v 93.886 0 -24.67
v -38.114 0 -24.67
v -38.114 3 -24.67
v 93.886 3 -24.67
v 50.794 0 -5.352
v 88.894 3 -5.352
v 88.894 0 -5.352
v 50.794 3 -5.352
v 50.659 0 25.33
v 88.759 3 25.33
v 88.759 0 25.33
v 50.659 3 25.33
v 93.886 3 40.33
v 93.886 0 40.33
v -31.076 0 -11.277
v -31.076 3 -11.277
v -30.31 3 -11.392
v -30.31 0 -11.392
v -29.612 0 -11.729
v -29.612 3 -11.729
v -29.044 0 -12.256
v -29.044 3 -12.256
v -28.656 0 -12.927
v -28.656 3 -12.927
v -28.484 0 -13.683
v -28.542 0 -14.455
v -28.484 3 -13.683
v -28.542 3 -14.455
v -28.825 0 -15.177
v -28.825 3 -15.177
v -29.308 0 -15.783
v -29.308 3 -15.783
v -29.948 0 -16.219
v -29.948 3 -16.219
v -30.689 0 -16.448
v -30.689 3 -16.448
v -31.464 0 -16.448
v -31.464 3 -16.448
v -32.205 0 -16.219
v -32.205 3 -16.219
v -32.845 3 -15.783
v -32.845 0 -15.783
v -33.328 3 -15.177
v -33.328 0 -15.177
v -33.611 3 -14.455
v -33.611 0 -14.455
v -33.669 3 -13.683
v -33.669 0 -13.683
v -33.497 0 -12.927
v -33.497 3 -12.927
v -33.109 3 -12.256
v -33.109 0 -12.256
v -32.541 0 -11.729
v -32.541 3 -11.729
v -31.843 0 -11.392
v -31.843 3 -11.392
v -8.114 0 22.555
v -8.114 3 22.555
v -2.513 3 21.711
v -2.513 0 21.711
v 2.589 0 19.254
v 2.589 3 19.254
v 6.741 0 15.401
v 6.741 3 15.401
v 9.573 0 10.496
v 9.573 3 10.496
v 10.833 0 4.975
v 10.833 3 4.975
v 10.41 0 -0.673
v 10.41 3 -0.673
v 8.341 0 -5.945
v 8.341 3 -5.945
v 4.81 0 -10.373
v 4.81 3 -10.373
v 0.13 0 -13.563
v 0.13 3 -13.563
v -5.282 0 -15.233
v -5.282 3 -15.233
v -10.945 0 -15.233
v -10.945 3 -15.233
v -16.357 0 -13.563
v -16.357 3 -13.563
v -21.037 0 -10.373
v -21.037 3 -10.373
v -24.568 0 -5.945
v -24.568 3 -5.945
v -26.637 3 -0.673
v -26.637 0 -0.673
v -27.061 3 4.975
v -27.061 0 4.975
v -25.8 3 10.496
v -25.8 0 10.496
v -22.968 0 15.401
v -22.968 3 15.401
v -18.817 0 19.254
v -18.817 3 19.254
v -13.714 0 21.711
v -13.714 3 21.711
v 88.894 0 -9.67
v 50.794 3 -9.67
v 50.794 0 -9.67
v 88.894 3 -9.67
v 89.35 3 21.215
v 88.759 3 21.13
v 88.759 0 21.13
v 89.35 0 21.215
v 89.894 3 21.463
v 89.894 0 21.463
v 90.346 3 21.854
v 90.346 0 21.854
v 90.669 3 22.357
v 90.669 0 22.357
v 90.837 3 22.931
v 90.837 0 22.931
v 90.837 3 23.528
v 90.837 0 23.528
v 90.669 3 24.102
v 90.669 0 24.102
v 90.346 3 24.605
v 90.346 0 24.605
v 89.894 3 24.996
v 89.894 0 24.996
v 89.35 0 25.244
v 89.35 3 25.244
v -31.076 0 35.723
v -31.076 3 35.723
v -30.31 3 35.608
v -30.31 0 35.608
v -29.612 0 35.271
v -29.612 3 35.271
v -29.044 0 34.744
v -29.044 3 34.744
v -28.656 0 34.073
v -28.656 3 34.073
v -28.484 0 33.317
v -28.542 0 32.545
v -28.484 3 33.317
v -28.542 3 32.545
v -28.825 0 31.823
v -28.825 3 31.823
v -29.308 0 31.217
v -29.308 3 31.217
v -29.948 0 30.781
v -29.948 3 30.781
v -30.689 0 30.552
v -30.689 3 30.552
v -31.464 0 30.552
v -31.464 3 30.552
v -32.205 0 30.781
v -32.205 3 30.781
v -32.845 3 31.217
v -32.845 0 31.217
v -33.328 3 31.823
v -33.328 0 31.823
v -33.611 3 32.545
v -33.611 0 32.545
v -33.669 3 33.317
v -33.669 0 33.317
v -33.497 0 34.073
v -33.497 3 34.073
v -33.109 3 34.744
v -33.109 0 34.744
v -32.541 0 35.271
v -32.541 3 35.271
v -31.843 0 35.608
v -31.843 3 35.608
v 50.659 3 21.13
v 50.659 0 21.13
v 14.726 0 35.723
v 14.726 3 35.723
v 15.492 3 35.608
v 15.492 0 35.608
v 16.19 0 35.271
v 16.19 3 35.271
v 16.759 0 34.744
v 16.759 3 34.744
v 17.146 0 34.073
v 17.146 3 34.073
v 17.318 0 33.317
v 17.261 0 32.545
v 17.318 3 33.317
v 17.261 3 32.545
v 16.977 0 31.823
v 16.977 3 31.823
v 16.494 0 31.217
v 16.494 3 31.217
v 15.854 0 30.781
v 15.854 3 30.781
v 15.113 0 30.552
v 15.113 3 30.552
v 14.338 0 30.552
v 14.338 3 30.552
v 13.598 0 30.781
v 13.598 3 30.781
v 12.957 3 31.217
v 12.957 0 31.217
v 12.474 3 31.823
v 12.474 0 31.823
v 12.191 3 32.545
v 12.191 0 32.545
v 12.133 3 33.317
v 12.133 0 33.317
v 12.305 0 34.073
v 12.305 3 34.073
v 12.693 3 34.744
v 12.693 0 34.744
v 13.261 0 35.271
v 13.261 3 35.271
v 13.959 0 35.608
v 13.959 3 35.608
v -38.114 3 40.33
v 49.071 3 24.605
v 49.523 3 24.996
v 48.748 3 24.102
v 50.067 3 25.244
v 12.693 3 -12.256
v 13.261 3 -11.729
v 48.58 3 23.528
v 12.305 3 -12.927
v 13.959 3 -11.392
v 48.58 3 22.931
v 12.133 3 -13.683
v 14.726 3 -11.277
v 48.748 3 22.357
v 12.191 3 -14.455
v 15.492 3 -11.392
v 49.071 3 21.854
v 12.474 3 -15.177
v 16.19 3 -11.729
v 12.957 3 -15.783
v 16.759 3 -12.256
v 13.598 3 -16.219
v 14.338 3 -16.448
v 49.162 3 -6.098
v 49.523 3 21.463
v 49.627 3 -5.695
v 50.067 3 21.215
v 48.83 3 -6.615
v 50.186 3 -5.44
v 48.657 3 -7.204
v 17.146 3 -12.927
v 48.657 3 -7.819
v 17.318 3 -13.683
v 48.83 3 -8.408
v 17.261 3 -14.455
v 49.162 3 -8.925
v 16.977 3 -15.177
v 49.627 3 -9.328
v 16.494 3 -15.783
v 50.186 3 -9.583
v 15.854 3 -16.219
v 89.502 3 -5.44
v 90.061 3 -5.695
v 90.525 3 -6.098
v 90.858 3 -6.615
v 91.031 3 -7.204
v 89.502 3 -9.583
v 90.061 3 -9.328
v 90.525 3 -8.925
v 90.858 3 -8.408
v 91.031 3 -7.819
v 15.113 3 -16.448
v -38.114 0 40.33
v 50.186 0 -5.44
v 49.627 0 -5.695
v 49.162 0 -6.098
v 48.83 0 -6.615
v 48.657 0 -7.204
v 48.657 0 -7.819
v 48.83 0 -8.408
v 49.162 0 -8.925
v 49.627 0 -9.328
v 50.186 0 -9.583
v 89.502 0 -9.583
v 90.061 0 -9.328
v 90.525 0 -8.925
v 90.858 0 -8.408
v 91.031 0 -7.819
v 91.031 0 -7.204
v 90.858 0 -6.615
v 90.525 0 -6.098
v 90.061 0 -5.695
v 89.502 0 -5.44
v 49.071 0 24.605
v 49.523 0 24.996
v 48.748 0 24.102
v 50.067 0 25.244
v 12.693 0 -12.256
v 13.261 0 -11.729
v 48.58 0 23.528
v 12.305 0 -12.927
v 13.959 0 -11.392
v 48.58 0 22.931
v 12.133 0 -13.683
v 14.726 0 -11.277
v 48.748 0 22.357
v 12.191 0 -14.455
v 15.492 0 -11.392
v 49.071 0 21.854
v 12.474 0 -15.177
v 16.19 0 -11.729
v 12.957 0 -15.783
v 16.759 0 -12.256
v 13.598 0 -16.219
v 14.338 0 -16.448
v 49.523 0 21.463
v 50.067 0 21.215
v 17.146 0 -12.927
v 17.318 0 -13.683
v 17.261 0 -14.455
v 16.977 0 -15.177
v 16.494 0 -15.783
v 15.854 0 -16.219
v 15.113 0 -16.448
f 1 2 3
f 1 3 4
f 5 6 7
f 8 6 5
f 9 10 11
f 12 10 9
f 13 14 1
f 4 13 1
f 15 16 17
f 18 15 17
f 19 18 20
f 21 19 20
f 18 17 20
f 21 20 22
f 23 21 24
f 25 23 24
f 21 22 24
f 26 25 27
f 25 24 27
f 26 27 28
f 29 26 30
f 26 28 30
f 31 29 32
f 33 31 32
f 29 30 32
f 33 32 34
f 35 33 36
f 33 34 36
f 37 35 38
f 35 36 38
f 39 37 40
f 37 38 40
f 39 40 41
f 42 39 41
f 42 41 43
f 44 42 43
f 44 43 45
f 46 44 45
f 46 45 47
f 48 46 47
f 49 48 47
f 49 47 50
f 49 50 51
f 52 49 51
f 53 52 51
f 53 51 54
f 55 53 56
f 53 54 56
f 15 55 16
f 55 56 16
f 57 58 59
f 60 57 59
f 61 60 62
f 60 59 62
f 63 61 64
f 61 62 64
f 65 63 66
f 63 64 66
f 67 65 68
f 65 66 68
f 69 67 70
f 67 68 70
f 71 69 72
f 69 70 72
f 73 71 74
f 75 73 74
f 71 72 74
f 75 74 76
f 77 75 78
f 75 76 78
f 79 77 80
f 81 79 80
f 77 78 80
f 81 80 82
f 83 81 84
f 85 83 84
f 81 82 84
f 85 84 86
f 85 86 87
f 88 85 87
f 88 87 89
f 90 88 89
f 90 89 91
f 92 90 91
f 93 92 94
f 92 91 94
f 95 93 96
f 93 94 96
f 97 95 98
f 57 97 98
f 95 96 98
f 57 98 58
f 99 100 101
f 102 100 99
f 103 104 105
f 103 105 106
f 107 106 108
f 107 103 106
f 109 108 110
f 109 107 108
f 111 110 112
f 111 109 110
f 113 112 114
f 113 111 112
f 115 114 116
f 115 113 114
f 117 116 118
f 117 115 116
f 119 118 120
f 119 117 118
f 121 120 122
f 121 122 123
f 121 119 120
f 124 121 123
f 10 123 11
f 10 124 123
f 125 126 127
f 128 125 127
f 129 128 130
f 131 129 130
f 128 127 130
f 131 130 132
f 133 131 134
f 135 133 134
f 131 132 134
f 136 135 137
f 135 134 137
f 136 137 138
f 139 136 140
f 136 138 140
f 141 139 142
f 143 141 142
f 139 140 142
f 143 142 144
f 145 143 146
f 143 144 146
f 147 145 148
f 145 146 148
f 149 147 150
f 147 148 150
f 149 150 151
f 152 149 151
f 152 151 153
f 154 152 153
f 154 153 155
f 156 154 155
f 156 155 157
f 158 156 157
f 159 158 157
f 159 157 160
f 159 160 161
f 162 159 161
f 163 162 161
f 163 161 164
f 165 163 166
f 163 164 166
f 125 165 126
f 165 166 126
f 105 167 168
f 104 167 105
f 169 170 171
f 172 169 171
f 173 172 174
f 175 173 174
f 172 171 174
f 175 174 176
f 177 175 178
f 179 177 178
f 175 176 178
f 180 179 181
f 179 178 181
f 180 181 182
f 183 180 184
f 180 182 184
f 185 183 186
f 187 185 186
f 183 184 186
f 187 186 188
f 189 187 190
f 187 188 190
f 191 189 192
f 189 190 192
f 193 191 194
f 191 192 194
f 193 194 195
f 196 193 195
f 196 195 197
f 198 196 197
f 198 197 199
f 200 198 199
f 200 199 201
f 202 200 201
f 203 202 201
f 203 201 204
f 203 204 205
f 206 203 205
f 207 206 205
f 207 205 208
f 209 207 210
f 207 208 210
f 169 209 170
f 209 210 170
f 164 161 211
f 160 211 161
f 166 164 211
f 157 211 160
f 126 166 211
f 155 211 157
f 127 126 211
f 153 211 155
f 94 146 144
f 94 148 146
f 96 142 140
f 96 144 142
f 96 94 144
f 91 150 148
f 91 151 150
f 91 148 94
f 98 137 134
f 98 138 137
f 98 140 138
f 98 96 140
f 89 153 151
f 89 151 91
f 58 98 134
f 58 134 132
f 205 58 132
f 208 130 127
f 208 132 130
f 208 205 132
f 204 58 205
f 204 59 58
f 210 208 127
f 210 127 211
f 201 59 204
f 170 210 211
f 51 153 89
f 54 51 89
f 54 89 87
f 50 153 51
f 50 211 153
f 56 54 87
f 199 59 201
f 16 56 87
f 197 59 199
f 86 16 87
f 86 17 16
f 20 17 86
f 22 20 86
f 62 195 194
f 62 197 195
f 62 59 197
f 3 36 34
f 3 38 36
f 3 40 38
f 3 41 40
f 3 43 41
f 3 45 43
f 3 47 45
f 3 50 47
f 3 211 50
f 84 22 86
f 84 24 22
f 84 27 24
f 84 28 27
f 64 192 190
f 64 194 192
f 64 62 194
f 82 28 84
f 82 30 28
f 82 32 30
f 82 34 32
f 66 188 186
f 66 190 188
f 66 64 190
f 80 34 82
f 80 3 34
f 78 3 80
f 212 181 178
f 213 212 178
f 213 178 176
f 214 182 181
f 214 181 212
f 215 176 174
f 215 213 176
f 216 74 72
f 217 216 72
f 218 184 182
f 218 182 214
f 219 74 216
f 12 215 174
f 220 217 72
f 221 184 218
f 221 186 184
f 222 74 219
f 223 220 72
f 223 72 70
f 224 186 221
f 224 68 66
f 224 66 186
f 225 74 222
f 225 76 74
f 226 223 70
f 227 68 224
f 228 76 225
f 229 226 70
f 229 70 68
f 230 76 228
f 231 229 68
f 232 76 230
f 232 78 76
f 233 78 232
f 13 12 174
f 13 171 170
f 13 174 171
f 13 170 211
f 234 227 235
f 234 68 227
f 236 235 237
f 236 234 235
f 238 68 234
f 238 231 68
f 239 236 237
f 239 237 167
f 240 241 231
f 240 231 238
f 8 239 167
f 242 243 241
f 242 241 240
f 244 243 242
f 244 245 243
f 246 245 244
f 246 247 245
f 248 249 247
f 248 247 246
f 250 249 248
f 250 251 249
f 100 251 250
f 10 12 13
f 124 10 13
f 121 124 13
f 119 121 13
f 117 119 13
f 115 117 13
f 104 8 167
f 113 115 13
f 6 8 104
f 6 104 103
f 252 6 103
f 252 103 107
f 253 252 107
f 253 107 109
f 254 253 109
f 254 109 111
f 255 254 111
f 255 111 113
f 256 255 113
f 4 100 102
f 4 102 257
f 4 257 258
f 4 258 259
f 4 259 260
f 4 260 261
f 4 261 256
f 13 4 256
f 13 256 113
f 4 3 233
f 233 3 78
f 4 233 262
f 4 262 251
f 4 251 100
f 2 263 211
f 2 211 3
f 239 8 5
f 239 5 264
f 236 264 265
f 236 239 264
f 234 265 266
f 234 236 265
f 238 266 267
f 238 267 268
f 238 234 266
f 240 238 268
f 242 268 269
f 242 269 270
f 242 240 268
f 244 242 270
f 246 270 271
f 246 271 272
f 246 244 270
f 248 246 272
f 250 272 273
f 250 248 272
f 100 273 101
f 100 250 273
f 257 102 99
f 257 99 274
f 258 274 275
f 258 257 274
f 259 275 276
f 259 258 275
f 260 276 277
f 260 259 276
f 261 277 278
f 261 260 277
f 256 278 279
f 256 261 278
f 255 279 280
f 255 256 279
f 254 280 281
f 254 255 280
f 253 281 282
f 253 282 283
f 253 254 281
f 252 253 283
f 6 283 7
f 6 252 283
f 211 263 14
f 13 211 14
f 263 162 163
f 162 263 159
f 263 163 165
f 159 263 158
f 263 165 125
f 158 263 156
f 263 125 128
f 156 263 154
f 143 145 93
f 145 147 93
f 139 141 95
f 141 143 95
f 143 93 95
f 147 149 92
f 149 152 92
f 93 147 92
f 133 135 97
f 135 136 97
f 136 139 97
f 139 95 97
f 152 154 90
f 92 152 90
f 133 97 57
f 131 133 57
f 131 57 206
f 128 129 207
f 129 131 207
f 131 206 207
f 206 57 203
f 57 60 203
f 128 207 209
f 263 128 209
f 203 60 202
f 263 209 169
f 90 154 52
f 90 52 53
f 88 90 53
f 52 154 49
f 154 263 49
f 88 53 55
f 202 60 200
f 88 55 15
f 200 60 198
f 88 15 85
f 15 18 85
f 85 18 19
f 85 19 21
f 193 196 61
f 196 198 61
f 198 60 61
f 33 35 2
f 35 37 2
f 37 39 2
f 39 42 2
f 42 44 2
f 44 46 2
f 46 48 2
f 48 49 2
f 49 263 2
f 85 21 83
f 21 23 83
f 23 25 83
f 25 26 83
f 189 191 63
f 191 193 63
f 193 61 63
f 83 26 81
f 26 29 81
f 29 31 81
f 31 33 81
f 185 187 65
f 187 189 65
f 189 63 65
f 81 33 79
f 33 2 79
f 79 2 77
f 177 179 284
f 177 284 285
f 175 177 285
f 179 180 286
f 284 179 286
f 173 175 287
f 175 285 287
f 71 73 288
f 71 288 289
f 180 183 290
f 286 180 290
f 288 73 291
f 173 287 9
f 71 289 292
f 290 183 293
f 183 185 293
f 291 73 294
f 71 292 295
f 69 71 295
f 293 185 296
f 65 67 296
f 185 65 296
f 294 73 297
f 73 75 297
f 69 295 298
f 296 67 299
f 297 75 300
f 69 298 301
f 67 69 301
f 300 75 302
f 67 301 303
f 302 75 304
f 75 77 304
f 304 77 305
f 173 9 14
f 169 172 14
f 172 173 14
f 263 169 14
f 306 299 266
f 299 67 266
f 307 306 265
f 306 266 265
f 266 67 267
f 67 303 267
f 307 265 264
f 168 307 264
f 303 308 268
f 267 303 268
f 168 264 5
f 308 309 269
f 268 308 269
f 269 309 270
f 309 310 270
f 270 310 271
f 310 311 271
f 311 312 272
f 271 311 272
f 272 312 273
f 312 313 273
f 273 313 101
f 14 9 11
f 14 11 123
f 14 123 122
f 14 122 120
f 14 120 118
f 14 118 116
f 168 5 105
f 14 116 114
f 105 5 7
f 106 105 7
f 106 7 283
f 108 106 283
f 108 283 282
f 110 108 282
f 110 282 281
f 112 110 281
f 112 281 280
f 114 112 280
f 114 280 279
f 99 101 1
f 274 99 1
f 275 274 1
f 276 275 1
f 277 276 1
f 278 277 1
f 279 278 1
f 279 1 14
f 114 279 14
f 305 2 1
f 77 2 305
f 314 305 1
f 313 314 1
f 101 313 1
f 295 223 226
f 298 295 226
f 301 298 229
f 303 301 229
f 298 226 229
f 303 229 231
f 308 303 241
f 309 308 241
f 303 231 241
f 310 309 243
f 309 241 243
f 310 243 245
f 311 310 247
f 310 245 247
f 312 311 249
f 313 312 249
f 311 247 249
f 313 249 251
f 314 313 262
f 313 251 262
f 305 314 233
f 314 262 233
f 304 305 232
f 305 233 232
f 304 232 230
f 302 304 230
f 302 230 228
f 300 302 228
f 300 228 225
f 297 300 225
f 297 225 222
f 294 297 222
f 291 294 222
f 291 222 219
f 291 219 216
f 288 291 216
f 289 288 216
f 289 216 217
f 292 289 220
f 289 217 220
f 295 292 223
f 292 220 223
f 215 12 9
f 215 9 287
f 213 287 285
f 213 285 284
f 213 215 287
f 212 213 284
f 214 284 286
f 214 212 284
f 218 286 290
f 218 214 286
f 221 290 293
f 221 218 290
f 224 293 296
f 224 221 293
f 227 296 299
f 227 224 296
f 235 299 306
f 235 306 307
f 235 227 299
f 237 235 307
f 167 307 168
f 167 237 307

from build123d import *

# Parameters (mm, degrees)
SKETCH1_W           = 132
SKETCH1_H           = 65
BOSS_EXTRUDE1_DEPTH = 3
SKETCH2_R           = 19
SKETCH2_R_2         = 2.6
CUT_EXTRUDE3_DEPTH  = 3
CUT_EXTRUDE5_DEPTH  = 3


with BuildPart() as part:
    # Sketch1 → Boss-Extrude1 (new body)
    with BuildSketch(Plane(origin=(0, 0, 0), x_dir=(1, 0, 0), z_dir=(0, 1, 0))):
        with Locations((27.886363636, -7.829545455)):
            Rectangle(SKETCH1_W, SKETCH1_H)
    extrude(amount=BOSS_EXTRUDE1_DEPTH)

    # Sketch2 → Cut-Extrude3 (cut)
    with BuildSketch(Plane(origin=(0, 3, 0), x_dir=(1, 0, 0), z_dir=(0, 1, 0))):
        with Locations(Location((-8.113636364, -3.555015025, 0), (0, 0, 270))):
            Circle(SKETCH2_R)
        with Locations(Location((-31.076450467, 13.876917129, 0), (0, 0, 270))):
            Circle(SKETCH2_R_2)
        with Locations(Location((-31.076450467, -33.123082871, 0), (0, 0, 270))):
            Circle(SKETCH2_R_2)
        with Locations(Location((14.725739937, 13.876917129, 0), (0, 0, 270))):
            Circle(SKETCH2_R_2)
        with Locations(Location((14.725739937, -33.123082871, 0), (0, 0, 270))):
            Circle(SKETCH2_R_2)
    extrude(amount=-CUT_EXTRUDE3_DEPTH, mode=Mode.SUBTRACT)

    # Sketch5 → Cut-Extrude5 (cut)
    with BuildSketch(Plane(origin=(0, 3, 0), x_dir=(1, 0, 0), z_dir=(0, 1, 0))):
        with BuildLine():
            Line((50.793786384, 9.670454545), (88.893786384, 9.670454545))
            ThreePointArc((88.893786384, 9.670454545), (91.052786384, 7.511454545), (88.893786384, 5.352454545))
            Line((88.893786384, 5.352454545), (50.793786384, 5.352454545))
            ThreePointArc((50.793786384, 5.352454545), (48.634786384, 7.511454545), (50.793786384, 9.670454545))
        make_face()
        with BuildLine():
            Line((50.658524024, -21.129545455), (88.758524024, -21.129545455))
            ThreePointArc((88.758524024, -21.129545455), (90.858524024, -23.229545455), (88.758524024, -25.329545455))
            Line((88.758524024, -25.329545455), (50.658524024, -25.329545455))
            ThreePointArc((50.658524024, -25.329545455), (48.558524024, -23.229545455), (50.658524024, -21.129545455))
        make_face()
    extrude(amount=-CUT_EXTRUDE5_DEPTH, mode=Mode.SUBTRACT)


solid = part.part
